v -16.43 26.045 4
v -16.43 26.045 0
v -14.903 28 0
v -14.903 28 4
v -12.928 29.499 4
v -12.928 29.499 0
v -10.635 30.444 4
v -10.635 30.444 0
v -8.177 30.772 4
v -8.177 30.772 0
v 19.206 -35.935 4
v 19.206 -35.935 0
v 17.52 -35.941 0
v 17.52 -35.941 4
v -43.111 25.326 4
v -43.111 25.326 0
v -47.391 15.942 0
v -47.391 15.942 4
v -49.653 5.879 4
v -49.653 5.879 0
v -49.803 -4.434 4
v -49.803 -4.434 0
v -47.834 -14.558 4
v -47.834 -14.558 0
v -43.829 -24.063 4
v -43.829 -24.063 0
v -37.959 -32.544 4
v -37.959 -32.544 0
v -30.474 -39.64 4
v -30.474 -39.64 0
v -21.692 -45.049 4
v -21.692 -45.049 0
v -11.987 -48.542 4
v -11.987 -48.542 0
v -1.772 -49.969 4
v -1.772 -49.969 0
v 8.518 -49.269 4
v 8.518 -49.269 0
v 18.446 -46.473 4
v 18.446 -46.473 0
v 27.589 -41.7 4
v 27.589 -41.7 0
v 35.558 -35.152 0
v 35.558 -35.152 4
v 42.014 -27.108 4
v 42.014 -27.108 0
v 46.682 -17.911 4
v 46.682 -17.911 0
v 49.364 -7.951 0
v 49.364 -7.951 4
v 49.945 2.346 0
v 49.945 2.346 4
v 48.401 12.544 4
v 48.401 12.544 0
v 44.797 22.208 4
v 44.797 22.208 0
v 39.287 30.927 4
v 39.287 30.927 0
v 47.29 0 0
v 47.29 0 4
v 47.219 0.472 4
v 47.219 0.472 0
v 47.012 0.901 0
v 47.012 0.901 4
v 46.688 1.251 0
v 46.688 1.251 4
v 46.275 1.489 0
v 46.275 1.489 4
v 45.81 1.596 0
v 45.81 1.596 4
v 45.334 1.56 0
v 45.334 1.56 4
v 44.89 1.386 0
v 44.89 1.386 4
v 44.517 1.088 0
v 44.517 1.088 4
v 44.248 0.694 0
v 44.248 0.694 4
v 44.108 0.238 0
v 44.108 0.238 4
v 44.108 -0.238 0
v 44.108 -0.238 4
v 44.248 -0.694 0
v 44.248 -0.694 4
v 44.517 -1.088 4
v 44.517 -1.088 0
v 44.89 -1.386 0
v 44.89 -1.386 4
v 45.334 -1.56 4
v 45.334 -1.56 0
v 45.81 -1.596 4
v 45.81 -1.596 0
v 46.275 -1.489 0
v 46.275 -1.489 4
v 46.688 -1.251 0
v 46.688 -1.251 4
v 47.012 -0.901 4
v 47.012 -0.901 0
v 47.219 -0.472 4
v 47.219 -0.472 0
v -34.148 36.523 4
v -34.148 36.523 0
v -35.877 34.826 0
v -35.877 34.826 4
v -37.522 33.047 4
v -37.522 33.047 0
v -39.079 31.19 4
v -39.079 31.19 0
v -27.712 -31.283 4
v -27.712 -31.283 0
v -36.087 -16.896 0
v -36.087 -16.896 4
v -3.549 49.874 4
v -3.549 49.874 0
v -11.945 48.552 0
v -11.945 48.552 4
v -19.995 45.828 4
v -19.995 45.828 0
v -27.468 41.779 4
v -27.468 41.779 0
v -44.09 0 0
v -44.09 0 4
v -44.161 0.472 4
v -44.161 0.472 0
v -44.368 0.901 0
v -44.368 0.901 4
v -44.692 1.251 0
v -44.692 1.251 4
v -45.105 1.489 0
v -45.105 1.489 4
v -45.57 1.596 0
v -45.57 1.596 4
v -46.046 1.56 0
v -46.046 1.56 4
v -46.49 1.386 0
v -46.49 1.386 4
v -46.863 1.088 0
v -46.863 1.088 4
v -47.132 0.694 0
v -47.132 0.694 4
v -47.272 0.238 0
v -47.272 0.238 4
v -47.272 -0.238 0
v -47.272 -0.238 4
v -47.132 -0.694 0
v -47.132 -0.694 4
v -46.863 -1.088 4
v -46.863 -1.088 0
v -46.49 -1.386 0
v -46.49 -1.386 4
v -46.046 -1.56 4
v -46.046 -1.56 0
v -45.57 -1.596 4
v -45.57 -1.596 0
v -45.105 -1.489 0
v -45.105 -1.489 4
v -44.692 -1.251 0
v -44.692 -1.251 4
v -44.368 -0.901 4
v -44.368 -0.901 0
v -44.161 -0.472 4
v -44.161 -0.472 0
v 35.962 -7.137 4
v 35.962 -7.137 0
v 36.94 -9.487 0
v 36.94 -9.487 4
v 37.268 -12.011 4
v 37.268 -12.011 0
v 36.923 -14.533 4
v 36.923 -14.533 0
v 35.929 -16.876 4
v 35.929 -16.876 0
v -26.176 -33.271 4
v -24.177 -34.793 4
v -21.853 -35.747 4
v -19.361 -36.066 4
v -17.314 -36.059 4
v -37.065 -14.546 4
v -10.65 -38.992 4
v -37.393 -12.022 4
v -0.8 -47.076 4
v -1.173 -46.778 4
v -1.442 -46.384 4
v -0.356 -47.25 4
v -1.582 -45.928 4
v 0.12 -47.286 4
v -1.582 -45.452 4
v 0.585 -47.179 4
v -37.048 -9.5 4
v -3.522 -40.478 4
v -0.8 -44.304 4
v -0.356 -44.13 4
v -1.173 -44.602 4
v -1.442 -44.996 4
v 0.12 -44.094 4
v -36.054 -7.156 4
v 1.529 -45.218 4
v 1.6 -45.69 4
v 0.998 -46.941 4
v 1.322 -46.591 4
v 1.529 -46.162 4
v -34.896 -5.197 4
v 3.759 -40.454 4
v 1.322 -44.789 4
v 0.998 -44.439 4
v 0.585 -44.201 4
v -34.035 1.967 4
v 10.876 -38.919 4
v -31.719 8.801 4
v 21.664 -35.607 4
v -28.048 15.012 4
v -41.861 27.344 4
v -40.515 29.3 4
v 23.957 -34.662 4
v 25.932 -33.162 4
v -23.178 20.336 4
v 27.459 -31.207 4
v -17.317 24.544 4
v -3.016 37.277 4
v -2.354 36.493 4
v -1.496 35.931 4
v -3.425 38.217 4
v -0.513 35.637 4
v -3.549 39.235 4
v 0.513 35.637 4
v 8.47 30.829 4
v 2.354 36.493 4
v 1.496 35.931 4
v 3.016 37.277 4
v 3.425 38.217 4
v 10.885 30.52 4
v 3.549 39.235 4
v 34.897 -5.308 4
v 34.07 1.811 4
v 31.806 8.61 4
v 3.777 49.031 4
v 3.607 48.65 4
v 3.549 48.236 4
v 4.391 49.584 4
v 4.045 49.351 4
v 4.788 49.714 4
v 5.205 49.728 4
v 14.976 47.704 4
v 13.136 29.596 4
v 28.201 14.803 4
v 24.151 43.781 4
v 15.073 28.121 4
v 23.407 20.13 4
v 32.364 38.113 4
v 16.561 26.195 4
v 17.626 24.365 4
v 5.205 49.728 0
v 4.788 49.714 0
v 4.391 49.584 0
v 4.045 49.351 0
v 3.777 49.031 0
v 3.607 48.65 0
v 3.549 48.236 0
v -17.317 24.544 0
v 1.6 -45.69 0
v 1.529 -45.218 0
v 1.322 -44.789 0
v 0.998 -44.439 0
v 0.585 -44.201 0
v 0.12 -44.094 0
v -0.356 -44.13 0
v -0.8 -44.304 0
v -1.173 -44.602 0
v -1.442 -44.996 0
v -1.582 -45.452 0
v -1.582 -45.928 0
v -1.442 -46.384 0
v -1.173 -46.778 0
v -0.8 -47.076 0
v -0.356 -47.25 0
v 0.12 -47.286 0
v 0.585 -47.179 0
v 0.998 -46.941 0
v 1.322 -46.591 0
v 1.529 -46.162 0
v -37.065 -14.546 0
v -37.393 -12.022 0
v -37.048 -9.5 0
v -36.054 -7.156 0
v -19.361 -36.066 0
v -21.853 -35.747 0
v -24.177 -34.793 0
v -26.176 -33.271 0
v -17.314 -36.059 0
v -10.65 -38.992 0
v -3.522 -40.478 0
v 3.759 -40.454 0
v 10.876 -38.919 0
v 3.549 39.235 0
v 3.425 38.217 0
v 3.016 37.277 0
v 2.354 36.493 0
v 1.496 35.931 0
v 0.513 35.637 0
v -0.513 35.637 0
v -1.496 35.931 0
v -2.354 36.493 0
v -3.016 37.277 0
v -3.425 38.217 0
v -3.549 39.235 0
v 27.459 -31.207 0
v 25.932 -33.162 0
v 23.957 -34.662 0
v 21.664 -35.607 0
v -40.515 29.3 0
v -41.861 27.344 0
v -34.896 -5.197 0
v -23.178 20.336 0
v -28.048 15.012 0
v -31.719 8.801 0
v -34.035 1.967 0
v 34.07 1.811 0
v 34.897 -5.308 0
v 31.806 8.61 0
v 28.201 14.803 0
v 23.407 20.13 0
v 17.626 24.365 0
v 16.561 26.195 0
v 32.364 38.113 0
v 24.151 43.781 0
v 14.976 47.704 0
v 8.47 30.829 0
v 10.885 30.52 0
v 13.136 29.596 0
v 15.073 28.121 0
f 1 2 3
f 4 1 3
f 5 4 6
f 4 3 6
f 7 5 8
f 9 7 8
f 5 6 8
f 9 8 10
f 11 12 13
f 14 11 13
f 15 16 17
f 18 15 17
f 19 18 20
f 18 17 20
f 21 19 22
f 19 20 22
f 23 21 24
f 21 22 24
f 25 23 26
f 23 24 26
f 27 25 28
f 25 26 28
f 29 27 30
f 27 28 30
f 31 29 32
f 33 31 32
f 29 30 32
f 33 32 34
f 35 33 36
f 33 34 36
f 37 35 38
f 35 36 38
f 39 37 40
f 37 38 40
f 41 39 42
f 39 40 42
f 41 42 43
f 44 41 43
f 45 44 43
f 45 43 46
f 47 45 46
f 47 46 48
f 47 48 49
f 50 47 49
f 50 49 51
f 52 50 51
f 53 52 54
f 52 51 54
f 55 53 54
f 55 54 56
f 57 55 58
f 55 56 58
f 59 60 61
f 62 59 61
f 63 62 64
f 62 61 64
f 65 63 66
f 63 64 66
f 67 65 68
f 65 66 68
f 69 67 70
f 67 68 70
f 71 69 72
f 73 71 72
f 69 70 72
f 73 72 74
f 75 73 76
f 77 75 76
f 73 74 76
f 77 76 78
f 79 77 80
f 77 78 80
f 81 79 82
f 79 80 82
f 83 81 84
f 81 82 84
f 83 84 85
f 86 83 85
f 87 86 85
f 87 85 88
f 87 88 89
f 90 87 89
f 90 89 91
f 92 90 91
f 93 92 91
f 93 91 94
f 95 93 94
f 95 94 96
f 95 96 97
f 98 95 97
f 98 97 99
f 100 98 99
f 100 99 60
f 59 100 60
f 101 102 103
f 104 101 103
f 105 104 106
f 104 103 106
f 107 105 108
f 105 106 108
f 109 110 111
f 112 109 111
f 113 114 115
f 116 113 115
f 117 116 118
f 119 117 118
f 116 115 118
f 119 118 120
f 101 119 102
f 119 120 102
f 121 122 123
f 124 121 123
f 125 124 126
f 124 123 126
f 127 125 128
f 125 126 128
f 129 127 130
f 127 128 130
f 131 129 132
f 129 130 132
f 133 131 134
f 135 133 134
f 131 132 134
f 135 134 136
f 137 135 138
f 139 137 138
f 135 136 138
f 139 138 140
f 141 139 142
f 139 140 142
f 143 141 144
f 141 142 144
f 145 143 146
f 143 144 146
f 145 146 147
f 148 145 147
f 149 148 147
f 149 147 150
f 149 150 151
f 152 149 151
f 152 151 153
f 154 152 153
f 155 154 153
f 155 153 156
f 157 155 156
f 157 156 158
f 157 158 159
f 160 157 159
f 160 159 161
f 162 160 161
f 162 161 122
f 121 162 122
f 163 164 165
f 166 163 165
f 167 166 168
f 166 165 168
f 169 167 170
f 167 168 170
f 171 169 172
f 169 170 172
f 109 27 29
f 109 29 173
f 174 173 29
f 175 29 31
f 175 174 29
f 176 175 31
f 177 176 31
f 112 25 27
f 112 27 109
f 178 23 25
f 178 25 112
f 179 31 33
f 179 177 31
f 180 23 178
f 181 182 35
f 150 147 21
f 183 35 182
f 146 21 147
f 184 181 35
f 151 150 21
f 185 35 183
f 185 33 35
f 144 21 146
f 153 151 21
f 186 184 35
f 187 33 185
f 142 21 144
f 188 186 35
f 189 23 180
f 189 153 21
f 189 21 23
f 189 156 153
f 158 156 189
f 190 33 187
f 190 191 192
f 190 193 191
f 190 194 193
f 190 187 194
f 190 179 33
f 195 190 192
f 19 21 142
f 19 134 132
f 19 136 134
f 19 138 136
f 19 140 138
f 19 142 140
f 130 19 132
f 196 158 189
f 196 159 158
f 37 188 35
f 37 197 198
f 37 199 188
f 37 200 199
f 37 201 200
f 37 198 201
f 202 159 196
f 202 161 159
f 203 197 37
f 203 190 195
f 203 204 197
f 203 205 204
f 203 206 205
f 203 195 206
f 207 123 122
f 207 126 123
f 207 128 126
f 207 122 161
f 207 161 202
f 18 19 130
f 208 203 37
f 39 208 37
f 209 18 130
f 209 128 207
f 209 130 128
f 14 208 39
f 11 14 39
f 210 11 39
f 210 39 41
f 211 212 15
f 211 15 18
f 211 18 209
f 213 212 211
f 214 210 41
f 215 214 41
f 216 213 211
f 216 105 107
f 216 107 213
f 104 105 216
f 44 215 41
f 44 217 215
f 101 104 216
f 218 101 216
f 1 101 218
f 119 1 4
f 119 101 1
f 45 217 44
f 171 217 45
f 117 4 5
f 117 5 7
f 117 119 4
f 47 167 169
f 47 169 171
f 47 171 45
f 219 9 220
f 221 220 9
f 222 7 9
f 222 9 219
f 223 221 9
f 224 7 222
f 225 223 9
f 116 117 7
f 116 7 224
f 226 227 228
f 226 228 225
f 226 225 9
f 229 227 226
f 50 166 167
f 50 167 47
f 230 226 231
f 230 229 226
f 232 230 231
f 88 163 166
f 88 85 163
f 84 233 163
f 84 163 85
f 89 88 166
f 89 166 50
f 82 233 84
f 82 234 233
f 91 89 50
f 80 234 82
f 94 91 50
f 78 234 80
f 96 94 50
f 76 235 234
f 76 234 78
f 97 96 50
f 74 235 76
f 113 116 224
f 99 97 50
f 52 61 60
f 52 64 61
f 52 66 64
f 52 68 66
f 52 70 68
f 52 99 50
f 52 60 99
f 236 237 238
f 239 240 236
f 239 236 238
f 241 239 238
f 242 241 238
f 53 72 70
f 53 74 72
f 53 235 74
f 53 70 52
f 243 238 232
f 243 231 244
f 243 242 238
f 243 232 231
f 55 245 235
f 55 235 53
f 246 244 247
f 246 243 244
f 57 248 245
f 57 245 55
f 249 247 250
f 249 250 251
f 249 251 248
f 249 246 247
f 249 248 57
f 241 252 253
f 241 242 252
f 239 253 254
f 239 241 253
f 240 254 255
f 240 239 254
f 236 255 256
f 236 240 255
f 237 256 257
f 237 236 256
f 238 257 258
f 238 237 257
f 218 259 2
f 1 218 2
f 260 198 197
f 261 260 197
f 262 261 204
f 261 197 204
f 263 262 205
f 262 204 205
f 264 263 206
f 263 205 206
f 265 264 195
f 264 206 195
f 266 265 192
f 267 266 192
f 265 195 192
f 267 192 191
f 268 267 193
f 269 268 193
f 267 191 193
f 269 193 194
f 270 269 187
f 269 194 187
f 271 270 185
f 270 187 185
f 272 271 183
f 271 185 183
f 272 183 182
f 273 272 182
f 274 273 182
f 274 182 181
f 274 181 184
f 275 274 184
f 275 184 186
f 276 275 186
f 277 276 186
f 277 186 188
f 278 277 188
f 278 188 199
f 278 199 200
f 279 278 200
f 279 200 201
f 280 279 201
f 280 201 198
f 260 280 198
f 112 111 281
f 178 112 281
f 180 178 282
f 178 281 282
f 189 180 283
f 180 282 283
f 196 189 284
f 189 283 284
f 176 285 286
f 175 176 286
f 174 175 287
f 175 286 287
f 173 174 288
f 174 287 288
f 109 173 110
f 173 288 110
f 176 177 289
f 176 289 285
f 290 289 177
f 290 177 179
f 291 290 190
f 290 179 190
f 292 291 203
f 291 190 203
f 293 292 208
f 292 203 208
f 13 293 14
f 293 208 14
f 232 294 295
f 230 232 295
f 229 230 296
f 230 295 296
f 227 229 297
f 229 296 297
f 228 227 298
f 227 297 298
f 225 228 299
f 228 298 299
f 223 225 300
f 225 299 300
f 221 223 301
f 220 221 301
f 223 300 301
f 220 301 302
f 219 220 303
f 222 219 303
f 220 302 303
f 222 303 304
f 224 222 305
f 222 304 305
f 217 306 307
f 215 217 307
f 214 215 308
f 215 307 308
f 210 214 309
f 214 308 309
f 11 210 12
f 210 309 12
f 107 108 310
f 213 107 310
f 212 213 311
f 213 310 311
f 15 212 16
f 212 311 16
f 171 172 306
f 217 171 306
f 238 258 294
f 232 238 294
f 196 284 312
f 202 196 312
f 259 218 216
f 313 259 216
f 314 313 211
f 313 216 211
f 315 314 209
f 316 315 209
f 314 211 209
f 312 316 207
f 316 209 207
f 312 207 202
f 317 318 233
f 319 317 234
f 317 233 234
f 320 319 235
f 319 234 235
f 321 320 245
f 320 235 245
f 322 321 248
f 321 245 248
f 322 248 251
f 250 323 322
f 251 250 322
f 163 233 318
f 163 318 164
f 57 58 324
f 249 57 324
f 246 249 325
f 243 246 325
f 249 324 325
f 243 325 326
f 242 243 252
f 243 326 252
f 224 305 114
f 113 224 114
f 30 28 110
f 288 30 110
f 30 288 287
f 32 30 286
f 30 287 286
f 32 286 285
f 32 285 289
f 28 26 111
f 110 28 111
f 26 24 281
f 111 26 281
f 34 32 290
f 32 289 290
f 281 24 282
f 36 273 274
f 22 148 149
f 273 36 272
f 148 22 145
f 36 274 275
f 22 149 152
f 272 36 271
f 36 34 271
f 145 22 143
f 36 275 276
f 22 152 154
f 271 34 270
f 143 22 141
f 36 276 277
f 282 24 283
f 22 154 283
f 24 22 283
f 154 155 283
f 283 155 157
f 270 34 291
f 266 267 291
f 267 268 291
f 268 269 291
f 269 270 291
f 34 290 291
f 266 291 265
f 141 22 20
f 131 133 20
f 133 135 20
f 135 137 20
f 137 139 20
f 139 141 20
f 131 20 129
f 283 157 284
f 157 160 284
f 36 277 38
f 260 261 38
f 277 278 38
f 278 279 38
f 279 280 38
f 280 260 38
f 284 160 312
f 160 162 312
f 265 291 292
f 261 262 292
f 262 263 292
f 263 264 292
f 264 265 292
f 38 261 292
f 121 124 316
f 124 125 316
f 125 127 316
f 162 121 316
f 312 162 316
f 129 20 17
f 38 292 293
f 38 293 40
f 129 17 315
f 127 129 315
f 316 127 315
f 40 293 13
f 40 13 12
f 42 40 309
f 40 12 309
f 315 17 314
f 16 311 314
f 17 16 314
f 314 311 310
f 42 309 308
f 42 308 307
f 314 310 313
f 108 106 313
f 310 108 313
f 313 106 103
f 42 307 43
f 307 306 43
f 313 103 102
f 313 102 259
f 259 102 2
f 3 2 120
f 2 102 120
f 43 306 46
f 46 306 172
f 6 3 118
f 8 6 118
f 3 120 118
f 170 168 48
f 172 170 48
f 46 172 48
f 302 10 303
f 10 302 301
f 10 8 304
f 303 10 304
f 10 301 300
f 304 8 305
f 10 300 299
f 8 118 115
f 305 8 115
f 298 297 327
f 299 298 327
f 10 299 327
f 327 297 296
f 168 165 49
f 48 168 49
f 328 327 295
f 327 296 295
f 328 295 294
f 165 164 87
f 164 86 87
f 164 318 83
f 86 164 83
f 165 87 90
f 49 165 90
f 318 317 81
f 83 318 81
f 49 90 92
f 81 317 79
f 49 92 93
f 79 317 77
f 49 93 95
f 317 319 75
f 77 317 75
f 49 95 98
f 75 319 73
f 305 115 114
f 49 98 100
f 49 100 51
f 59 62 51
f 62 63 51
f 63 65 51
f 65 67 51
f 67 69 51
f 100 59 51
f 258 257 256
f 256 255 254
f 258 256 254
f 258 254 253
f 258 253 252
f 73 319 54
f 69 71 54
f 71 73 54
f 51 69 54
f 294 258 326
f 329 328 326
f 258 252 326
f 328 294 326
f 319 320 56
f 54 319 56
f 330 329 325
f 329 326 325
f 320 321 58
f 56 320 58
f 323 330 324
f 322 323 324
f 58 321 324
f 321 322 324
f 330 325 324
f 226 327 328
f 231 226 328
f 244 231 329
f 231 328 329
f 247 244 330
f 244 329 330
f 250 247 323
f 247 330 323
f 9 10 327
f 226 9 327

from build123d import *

# Parameters (mm, degrees)
F1_DEPTH = 4
F2_R     = 1.5
F3_R     = 1.6
F4_DEPTH = 4.001
F5_R     = 34.9
F6_DEPTH = 4.001


# Not quite as in the source:
# - a feature names something its author has since deleted; it is built from what else it names


with BuildPart() as f1:
    # F0 (on Top) → F1 (new body)
    with BuildSketch(Plane.XY):
        with BuildLine():
            ThreePointArc((-39.0789468534, 31.1903176135), (-41.1995846792, 28.3300939331), (-43.1112914302, 25.3262028584))
            ThreePointArc((-43.1112914302, 25.3262028584), (3.3909583102, -49.8848814947), (39.2874210825, 30.9273106604))
            ThreePointArc((39.2874210825, 30.9273106604), (23.4196994292, 44.1759853161), (3.5489706102, 49.8738890363))
            Line((3.5489706102, 49.8738890363), (3.5489706102, 39.2354845469))
            ThreePointArc((3.5489706102, 39.2354845469), (0, 35.6), (-3.5489706102, 39.2354845469))
            Line((-3.5489706102, 39.2354845469), (-3.5489706102, 49.8738890363))
            ThreePointArc((-3.5489706102, 49.8738890363), (-19.9954983208, 45.8277213802), (-34.1476646001, 36.5231023102))
            ThreePointArc((-34.1476646001, 36.5231023102), (-36.7102683781, 33.9463723482), (-39.0789468534, 31.1903176135))
        make_face()
        with BuildLine():
            Line((-36.0538297274, -7.1563580217), (-16.4297758662, 26.0448529843))
            ThreePointArc((-16.4297758662, 26.0448529843), (-12.9279784785, 29.4992312077), (-8.176710299, 30.7723237188))
            Line((-8.176710299, 30.7723237188), (8.4702026349, 30.8290335362))
            ThreePointArc((8.4702026349, 30.8290335362), (13.1364940427, 29.5958615472), (16.5612188168, 26.1949427186))
            Line((16.5612188168, 26.1949427186), (35.9620596652, -7.1371930753))
            ThreePointArc((35.9620596652, -7.1371930753), (37.2684771199, -12.0112511492), (35.9293854445, -16.8764337932))
            Line((35.9293854445, -16.8764337932), (27.4589141067, -31.2073110011))
            ThreePointArc((27.4589141067, -31.2073110011), (23.957116719, -34.6616892246), (19.2058485395, -35.9347817357))
            Line((19.2058485395, -35.9347817357), (-19.3610626759, -36.0661648035))
            ThreePointArc((-19.3610626759, -36.0661648035), (-24.1774760593, -34.793319721), (-27.7123796465, -31.2829879542))
            Line((-27.7123796465, -31.2829879542), (-36.0865039481, -16.8955987396))
            ThreePointArc((-36.0865039481, -16.8955987396), (-37.3929214028, -12.0215406656), (-36.0538297274, -7.1563580217))
        make_face(mode=Mode.SUBTRACT)
    extrude(amount=F1_DEPTH)

    # F2
    f2_edges = [f1.edges().sort_by_distance(p)[0] for p in [
        (39.287421, 30.927311, 2),
        (3.548971, 49.873889, 2),
    ]]
    fillet(f2_edges, radius=F2_R)

    # F3 (on face) → F4 (cut, through all)
    with BuildSketch(Plane.XY.offset(4)):
        with Locations((0, 45.69)):
            Circle(F3_R)
        with Locations((-45.69, 0)):
            Circle(F3_R)
        with Locations((0, -45.69)):
            Circle(F3_R)
        with Locations((45.69, 0)):
            Circle(F3_R)
    extrude(amount=-F4_DEPTH, mode=Mode.SUBTRACT)

    # F5 (on face) → F6 (cut, through all)
    with BuildSketch(Plane.XY.offset(4)):
        with Locations((0, -5.7566108276)):
            Circle(F5_R)
    extrude(amount=-F6_DEPTH, mode=Mode.SUBTRACT)


solid = f1.part
